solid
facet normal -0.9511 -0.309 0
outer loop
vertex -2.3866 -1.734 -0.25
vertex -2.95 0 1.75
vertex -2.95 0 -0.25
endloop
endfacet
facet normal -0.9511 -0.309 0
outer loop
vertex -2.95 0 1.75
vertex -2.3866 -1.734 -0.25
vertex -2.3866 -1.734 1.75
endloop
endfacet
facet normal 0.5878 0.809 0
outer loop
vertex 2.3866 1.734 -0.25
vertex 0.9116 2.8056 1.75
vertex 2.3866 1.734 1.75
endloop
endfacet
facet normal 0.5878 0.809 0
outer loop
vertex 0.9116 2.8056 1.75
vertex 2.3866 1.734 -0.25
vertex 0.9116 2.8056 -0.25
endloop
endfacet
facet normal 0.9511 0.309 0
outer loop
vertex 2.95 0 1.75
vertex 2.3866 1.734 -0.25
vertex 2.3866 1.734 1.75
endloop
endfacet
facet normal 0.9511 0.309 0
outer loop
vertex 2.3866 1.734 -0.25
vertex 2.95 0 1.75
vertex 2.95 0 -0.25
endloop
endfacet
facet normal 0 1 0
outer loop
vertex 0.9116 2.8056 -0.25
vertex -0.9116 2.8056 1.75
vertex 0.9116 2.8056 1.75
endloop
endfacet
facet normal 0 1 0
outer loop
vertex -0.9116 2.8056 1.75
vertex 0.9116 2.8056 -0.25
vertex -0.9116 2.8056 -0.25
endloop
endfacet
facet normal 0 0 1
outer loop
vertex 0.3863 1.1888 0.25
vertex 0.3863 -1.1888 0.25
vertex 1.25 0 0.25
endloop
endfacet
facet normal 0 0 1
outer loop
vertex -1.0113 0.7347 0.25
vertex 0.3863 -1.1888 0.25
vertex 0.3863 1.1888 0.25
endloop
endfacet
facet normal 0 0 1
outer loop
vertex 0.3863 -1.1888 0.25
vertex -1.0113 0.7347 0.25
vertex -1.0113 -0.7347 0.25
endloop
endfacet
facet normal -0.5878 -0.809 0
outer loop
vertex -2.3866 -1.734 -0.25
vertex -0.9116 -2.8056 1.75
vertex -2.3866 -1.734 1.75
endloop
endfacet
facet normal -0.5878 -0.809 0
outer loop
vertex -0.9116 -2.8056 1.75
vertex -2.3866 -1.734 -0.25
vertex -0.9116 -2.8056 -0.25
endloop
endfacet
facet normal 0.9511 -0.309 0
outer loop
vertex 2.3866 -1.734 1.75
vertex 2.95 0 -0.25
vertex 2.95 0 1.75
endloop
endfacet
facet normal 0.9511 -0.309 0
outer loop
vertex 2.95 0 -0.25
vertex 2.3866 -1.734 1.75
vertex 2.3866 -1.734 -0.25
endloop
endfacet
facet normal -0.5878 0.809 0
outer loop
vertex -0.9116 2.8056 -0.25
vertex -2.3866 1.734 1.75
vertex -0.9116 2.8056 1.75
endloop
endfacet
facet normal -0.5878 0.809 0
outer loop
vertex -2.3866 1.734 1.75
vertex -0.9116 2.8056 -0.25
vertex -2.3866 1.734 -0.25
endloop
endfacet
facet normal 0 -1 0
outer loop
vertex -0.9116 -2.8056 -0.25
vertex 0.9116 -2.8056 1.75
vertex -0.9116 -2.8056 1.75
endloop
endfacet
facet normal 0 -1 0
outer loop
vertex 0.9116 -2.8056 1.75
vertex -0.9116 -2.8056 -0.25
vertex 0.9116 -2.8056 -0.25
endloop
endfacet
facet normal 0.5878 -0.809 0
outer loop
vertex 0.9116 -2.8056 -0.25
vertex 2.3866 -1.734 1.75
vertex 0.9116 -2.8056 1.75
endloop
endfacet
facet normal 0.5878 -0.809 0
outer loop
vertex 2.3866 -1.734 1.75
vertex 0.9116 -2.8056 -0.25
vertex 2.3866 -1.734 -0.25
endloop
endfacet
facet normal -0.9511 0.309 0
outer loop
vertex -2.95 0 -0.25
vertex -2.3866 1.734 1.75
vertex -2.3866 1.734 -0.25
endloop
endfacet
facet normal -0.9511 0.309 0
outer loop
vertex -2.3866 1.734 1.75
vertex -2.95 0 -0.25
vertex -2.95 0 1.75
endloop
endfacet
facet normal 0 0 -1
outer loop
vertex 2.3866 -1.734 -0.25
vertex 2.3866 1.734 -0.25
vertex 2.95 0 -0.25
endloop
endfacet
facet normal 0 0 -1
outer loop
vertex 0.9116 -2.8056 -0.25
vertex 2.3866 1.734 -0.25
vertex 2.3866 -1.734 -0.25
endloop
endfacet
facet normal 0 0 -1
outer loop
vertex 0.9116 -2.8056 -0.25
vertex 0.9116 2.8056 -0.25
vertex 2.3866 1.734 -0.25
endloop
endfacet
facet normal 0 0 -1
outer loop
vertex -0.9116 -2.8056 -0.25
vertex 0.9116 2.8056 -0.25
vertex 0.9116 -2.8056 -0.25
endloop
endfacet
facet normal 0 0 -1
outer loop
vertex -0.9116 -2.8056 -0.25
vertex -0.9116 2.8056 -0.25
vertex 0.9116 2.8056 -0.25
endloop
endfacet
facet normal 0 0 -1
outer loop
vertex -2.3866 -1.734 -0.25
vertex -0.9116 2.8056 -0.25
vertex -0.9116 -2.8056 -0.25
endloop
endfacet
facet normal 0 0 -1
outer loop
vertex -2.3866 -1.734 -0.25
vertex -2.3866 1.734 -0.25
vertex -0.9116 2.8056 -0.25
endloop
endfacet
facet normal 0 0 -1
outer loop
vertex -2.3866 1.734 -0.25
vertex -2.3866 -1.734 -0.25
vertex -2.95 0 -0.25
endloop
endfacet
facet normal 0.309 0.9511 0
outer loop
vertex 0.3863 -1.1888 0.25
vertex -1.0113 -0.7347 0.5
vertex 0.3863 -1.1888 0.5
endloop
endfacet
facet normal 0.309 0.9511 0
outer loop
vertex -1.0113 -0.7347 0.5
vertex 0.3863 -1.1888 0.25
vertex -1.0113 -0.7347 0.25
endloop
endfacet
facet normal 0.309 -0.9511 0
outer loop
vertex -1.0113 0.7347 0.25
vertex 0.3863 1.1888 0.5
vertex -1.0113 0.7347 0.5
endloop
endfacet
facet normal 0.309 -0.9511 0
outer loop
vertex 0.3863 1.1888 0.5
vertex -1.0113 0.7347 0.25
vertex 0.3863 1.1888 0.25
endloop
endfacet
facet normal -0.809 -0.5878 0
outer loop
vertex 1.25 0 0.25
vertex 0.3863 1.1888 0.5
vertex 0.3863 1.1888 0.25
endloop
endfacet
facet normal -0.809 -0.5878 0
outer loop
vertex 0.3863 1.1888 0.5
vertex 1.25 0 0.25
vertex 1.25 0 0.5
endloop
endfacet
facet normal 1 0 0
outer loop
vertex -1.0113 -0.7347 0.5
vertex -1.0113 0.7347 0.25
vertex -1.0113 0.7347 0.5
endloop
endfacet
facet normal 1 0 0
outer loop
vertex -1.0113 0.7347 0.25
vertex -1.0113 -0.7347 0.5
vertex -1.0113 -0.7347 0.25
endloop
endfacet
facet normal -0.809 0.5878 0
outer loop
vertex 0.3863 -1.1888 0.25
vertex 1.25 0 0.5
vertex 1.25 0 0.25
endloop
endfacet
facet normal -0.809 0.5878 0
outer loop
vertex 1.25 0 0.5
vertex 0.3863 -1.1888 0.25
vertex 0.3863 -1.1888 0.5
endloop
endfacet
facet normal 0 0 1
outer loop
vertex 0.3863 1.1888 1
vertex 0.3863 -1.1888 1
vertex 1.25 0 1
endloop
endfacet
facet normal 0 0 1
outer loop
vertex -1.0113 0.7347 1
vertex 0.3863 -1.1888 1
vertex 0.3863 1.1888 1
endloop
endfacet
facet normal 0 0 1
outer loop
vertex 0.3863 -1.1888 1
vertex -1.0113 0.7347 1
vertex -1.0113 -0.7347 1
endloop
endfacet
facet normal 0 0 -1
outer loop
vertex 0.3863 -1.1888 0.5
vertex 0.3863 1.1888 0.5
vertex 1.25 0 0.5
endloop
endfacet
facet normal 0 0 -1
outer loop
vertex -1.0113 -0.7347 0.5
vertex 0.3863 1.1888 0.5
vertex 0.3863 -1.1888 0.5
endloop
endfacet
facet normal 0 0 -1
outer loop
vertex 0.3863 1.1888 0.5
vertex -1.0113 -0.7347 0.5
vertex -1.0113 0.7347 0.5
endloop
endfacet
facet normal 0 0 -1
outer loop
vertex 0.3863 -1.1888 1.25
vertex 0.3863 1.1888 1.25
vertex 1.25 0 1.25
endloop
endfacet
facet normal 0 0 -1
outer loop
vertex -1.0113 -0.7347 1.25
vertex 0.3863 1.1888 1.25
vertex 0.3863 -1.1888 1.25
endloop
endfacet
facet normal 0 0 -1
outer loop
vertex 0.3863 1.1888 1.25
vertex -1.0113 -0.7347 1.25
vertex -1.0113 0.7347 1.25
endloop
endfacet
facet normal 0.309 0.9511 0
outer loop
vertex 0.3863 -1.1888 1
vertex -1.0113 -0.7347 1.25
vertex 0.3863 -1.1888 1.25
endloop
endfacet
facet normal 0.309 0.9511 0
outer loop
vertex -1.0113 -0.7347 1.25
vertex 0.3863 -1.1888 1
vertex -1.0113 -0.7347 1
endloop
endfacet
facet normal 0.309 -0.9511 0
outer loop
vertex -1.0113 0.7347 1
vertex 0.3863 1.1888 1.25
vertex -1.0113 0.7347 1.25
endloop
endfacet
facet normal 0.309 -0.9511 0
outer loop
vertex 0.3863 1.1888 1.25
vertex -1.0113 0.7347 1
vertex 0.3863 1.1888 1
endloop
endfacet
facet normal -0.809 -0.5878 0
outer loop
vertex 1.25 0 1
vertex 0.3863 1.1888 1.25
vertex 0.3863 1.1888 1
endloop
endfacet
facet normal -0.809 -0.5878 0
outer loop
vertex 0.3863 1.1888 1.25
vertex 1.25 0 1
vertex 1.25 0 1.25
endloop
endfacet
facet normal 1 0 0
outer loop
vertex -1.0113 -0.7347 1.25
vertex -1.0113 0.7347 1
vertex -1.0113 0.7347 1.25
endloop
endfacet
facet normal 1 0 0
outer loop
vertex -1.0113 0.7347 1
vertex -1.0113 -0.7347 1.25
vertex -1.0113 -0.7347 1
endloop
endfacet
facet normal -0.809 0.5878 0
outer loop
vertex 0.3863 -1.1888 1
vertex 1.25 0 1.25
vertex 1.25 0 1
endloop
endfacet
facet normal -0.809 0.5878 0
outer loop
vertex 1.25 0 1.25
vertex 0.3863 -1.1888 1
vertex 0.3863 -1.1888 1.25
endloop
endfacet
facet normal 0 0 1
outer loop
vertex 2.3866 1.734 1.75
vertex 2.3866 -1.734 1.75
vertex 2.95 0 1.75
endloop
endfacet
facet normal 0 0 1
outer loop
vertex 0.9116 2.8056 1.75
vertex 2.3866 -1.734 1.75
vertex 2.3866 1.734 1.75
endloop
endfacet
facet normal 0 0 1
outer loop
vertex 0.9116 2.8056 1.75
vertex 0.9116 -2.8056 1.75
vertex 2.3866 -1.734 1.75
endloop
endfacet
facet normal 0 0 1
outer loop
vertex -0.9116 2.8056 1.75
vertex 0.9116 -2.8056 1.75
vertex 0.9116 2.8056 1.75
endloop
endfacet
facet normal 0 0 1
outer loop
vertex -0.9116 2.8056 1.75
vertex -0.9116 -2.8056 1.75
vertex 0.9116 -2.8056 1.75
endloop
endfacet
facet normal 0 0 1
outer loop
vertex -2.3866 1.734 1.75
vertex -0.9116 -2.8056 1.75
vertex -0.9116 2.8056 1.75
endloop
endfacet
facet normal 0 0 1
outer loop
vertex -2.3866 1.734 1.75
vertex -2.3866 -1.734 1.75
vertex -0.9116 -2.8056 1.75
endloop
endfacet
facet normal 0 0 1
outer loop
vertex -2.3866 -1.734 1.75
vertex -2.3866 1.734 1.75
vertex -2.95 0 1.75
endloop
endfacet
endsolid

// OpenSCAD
// Parameters
inner_diameter_mm = 2.5; //[1.25:5:0.05]
outer_diameter_mm = 5.9; //[2.95:11.8:0.05]
thickness_mm = 0.5; //[0.25:1:0.05]
inner_radius_mm = 1.25; //[0.625:2.5:0.05]
outer_radius_mm = 2.95; //[1.475:5.9:0.05]
eps_mm = 0.2; //[0.05:0.5:0.05]

// Washer with central hole
module washer_disk_with_hole() {
  difference() {
    cylinder(r=outer_radius_mm, h=thickness_mm, center=true);
    cylinder(r=inner_radius_mm, h=thickness_mm + 2*eps_mm, center=true);
  }
}

// Round Grommet Top - Custom geometry
module round_grommet_top() {
  color("Silver") {
    cylinder(r=outer_radius_mm, h=thickness_mm, center=true);
  }
}

// Round Grommet Assembly - Custom geometry
module round_grommet_assembly() {
  color("Silver") {
    union() {
      round_grommet_top();
      washer_disk_with_hole();
    }
  }
}

// Nut and Washer - Custom geometry
module nut_and_washer() {
  color("DimGray") {
    union() {
      // Nut
      translate([0, 0, thickness_mm/2]) cylinder(r=outer_radius_mm, h=thickness_mm, center=true);
      // Washer
      washer_disk_with_hole();
    }
  }
}

// Screw and Washer - Custom geometry
module screw_and_washer() {
  color("Black") {
    union() {
      // Screw head
      translate([0, 0, thickness_mm]) cylinder(r=outer_radius_mm, h=thickness_mm, center=true);
      // Washer
      washer_disk_with_hole();
    }
  }
}

// Assembly
module assembly() {
  translate([0, 0, 0]) round_grommet_assembly();
  translate([0, 0, thickness_mm]) nut_and_washer();
  translate([0, 0, 2*thickness_mm]) screw_and_washer();
}

assembly();
